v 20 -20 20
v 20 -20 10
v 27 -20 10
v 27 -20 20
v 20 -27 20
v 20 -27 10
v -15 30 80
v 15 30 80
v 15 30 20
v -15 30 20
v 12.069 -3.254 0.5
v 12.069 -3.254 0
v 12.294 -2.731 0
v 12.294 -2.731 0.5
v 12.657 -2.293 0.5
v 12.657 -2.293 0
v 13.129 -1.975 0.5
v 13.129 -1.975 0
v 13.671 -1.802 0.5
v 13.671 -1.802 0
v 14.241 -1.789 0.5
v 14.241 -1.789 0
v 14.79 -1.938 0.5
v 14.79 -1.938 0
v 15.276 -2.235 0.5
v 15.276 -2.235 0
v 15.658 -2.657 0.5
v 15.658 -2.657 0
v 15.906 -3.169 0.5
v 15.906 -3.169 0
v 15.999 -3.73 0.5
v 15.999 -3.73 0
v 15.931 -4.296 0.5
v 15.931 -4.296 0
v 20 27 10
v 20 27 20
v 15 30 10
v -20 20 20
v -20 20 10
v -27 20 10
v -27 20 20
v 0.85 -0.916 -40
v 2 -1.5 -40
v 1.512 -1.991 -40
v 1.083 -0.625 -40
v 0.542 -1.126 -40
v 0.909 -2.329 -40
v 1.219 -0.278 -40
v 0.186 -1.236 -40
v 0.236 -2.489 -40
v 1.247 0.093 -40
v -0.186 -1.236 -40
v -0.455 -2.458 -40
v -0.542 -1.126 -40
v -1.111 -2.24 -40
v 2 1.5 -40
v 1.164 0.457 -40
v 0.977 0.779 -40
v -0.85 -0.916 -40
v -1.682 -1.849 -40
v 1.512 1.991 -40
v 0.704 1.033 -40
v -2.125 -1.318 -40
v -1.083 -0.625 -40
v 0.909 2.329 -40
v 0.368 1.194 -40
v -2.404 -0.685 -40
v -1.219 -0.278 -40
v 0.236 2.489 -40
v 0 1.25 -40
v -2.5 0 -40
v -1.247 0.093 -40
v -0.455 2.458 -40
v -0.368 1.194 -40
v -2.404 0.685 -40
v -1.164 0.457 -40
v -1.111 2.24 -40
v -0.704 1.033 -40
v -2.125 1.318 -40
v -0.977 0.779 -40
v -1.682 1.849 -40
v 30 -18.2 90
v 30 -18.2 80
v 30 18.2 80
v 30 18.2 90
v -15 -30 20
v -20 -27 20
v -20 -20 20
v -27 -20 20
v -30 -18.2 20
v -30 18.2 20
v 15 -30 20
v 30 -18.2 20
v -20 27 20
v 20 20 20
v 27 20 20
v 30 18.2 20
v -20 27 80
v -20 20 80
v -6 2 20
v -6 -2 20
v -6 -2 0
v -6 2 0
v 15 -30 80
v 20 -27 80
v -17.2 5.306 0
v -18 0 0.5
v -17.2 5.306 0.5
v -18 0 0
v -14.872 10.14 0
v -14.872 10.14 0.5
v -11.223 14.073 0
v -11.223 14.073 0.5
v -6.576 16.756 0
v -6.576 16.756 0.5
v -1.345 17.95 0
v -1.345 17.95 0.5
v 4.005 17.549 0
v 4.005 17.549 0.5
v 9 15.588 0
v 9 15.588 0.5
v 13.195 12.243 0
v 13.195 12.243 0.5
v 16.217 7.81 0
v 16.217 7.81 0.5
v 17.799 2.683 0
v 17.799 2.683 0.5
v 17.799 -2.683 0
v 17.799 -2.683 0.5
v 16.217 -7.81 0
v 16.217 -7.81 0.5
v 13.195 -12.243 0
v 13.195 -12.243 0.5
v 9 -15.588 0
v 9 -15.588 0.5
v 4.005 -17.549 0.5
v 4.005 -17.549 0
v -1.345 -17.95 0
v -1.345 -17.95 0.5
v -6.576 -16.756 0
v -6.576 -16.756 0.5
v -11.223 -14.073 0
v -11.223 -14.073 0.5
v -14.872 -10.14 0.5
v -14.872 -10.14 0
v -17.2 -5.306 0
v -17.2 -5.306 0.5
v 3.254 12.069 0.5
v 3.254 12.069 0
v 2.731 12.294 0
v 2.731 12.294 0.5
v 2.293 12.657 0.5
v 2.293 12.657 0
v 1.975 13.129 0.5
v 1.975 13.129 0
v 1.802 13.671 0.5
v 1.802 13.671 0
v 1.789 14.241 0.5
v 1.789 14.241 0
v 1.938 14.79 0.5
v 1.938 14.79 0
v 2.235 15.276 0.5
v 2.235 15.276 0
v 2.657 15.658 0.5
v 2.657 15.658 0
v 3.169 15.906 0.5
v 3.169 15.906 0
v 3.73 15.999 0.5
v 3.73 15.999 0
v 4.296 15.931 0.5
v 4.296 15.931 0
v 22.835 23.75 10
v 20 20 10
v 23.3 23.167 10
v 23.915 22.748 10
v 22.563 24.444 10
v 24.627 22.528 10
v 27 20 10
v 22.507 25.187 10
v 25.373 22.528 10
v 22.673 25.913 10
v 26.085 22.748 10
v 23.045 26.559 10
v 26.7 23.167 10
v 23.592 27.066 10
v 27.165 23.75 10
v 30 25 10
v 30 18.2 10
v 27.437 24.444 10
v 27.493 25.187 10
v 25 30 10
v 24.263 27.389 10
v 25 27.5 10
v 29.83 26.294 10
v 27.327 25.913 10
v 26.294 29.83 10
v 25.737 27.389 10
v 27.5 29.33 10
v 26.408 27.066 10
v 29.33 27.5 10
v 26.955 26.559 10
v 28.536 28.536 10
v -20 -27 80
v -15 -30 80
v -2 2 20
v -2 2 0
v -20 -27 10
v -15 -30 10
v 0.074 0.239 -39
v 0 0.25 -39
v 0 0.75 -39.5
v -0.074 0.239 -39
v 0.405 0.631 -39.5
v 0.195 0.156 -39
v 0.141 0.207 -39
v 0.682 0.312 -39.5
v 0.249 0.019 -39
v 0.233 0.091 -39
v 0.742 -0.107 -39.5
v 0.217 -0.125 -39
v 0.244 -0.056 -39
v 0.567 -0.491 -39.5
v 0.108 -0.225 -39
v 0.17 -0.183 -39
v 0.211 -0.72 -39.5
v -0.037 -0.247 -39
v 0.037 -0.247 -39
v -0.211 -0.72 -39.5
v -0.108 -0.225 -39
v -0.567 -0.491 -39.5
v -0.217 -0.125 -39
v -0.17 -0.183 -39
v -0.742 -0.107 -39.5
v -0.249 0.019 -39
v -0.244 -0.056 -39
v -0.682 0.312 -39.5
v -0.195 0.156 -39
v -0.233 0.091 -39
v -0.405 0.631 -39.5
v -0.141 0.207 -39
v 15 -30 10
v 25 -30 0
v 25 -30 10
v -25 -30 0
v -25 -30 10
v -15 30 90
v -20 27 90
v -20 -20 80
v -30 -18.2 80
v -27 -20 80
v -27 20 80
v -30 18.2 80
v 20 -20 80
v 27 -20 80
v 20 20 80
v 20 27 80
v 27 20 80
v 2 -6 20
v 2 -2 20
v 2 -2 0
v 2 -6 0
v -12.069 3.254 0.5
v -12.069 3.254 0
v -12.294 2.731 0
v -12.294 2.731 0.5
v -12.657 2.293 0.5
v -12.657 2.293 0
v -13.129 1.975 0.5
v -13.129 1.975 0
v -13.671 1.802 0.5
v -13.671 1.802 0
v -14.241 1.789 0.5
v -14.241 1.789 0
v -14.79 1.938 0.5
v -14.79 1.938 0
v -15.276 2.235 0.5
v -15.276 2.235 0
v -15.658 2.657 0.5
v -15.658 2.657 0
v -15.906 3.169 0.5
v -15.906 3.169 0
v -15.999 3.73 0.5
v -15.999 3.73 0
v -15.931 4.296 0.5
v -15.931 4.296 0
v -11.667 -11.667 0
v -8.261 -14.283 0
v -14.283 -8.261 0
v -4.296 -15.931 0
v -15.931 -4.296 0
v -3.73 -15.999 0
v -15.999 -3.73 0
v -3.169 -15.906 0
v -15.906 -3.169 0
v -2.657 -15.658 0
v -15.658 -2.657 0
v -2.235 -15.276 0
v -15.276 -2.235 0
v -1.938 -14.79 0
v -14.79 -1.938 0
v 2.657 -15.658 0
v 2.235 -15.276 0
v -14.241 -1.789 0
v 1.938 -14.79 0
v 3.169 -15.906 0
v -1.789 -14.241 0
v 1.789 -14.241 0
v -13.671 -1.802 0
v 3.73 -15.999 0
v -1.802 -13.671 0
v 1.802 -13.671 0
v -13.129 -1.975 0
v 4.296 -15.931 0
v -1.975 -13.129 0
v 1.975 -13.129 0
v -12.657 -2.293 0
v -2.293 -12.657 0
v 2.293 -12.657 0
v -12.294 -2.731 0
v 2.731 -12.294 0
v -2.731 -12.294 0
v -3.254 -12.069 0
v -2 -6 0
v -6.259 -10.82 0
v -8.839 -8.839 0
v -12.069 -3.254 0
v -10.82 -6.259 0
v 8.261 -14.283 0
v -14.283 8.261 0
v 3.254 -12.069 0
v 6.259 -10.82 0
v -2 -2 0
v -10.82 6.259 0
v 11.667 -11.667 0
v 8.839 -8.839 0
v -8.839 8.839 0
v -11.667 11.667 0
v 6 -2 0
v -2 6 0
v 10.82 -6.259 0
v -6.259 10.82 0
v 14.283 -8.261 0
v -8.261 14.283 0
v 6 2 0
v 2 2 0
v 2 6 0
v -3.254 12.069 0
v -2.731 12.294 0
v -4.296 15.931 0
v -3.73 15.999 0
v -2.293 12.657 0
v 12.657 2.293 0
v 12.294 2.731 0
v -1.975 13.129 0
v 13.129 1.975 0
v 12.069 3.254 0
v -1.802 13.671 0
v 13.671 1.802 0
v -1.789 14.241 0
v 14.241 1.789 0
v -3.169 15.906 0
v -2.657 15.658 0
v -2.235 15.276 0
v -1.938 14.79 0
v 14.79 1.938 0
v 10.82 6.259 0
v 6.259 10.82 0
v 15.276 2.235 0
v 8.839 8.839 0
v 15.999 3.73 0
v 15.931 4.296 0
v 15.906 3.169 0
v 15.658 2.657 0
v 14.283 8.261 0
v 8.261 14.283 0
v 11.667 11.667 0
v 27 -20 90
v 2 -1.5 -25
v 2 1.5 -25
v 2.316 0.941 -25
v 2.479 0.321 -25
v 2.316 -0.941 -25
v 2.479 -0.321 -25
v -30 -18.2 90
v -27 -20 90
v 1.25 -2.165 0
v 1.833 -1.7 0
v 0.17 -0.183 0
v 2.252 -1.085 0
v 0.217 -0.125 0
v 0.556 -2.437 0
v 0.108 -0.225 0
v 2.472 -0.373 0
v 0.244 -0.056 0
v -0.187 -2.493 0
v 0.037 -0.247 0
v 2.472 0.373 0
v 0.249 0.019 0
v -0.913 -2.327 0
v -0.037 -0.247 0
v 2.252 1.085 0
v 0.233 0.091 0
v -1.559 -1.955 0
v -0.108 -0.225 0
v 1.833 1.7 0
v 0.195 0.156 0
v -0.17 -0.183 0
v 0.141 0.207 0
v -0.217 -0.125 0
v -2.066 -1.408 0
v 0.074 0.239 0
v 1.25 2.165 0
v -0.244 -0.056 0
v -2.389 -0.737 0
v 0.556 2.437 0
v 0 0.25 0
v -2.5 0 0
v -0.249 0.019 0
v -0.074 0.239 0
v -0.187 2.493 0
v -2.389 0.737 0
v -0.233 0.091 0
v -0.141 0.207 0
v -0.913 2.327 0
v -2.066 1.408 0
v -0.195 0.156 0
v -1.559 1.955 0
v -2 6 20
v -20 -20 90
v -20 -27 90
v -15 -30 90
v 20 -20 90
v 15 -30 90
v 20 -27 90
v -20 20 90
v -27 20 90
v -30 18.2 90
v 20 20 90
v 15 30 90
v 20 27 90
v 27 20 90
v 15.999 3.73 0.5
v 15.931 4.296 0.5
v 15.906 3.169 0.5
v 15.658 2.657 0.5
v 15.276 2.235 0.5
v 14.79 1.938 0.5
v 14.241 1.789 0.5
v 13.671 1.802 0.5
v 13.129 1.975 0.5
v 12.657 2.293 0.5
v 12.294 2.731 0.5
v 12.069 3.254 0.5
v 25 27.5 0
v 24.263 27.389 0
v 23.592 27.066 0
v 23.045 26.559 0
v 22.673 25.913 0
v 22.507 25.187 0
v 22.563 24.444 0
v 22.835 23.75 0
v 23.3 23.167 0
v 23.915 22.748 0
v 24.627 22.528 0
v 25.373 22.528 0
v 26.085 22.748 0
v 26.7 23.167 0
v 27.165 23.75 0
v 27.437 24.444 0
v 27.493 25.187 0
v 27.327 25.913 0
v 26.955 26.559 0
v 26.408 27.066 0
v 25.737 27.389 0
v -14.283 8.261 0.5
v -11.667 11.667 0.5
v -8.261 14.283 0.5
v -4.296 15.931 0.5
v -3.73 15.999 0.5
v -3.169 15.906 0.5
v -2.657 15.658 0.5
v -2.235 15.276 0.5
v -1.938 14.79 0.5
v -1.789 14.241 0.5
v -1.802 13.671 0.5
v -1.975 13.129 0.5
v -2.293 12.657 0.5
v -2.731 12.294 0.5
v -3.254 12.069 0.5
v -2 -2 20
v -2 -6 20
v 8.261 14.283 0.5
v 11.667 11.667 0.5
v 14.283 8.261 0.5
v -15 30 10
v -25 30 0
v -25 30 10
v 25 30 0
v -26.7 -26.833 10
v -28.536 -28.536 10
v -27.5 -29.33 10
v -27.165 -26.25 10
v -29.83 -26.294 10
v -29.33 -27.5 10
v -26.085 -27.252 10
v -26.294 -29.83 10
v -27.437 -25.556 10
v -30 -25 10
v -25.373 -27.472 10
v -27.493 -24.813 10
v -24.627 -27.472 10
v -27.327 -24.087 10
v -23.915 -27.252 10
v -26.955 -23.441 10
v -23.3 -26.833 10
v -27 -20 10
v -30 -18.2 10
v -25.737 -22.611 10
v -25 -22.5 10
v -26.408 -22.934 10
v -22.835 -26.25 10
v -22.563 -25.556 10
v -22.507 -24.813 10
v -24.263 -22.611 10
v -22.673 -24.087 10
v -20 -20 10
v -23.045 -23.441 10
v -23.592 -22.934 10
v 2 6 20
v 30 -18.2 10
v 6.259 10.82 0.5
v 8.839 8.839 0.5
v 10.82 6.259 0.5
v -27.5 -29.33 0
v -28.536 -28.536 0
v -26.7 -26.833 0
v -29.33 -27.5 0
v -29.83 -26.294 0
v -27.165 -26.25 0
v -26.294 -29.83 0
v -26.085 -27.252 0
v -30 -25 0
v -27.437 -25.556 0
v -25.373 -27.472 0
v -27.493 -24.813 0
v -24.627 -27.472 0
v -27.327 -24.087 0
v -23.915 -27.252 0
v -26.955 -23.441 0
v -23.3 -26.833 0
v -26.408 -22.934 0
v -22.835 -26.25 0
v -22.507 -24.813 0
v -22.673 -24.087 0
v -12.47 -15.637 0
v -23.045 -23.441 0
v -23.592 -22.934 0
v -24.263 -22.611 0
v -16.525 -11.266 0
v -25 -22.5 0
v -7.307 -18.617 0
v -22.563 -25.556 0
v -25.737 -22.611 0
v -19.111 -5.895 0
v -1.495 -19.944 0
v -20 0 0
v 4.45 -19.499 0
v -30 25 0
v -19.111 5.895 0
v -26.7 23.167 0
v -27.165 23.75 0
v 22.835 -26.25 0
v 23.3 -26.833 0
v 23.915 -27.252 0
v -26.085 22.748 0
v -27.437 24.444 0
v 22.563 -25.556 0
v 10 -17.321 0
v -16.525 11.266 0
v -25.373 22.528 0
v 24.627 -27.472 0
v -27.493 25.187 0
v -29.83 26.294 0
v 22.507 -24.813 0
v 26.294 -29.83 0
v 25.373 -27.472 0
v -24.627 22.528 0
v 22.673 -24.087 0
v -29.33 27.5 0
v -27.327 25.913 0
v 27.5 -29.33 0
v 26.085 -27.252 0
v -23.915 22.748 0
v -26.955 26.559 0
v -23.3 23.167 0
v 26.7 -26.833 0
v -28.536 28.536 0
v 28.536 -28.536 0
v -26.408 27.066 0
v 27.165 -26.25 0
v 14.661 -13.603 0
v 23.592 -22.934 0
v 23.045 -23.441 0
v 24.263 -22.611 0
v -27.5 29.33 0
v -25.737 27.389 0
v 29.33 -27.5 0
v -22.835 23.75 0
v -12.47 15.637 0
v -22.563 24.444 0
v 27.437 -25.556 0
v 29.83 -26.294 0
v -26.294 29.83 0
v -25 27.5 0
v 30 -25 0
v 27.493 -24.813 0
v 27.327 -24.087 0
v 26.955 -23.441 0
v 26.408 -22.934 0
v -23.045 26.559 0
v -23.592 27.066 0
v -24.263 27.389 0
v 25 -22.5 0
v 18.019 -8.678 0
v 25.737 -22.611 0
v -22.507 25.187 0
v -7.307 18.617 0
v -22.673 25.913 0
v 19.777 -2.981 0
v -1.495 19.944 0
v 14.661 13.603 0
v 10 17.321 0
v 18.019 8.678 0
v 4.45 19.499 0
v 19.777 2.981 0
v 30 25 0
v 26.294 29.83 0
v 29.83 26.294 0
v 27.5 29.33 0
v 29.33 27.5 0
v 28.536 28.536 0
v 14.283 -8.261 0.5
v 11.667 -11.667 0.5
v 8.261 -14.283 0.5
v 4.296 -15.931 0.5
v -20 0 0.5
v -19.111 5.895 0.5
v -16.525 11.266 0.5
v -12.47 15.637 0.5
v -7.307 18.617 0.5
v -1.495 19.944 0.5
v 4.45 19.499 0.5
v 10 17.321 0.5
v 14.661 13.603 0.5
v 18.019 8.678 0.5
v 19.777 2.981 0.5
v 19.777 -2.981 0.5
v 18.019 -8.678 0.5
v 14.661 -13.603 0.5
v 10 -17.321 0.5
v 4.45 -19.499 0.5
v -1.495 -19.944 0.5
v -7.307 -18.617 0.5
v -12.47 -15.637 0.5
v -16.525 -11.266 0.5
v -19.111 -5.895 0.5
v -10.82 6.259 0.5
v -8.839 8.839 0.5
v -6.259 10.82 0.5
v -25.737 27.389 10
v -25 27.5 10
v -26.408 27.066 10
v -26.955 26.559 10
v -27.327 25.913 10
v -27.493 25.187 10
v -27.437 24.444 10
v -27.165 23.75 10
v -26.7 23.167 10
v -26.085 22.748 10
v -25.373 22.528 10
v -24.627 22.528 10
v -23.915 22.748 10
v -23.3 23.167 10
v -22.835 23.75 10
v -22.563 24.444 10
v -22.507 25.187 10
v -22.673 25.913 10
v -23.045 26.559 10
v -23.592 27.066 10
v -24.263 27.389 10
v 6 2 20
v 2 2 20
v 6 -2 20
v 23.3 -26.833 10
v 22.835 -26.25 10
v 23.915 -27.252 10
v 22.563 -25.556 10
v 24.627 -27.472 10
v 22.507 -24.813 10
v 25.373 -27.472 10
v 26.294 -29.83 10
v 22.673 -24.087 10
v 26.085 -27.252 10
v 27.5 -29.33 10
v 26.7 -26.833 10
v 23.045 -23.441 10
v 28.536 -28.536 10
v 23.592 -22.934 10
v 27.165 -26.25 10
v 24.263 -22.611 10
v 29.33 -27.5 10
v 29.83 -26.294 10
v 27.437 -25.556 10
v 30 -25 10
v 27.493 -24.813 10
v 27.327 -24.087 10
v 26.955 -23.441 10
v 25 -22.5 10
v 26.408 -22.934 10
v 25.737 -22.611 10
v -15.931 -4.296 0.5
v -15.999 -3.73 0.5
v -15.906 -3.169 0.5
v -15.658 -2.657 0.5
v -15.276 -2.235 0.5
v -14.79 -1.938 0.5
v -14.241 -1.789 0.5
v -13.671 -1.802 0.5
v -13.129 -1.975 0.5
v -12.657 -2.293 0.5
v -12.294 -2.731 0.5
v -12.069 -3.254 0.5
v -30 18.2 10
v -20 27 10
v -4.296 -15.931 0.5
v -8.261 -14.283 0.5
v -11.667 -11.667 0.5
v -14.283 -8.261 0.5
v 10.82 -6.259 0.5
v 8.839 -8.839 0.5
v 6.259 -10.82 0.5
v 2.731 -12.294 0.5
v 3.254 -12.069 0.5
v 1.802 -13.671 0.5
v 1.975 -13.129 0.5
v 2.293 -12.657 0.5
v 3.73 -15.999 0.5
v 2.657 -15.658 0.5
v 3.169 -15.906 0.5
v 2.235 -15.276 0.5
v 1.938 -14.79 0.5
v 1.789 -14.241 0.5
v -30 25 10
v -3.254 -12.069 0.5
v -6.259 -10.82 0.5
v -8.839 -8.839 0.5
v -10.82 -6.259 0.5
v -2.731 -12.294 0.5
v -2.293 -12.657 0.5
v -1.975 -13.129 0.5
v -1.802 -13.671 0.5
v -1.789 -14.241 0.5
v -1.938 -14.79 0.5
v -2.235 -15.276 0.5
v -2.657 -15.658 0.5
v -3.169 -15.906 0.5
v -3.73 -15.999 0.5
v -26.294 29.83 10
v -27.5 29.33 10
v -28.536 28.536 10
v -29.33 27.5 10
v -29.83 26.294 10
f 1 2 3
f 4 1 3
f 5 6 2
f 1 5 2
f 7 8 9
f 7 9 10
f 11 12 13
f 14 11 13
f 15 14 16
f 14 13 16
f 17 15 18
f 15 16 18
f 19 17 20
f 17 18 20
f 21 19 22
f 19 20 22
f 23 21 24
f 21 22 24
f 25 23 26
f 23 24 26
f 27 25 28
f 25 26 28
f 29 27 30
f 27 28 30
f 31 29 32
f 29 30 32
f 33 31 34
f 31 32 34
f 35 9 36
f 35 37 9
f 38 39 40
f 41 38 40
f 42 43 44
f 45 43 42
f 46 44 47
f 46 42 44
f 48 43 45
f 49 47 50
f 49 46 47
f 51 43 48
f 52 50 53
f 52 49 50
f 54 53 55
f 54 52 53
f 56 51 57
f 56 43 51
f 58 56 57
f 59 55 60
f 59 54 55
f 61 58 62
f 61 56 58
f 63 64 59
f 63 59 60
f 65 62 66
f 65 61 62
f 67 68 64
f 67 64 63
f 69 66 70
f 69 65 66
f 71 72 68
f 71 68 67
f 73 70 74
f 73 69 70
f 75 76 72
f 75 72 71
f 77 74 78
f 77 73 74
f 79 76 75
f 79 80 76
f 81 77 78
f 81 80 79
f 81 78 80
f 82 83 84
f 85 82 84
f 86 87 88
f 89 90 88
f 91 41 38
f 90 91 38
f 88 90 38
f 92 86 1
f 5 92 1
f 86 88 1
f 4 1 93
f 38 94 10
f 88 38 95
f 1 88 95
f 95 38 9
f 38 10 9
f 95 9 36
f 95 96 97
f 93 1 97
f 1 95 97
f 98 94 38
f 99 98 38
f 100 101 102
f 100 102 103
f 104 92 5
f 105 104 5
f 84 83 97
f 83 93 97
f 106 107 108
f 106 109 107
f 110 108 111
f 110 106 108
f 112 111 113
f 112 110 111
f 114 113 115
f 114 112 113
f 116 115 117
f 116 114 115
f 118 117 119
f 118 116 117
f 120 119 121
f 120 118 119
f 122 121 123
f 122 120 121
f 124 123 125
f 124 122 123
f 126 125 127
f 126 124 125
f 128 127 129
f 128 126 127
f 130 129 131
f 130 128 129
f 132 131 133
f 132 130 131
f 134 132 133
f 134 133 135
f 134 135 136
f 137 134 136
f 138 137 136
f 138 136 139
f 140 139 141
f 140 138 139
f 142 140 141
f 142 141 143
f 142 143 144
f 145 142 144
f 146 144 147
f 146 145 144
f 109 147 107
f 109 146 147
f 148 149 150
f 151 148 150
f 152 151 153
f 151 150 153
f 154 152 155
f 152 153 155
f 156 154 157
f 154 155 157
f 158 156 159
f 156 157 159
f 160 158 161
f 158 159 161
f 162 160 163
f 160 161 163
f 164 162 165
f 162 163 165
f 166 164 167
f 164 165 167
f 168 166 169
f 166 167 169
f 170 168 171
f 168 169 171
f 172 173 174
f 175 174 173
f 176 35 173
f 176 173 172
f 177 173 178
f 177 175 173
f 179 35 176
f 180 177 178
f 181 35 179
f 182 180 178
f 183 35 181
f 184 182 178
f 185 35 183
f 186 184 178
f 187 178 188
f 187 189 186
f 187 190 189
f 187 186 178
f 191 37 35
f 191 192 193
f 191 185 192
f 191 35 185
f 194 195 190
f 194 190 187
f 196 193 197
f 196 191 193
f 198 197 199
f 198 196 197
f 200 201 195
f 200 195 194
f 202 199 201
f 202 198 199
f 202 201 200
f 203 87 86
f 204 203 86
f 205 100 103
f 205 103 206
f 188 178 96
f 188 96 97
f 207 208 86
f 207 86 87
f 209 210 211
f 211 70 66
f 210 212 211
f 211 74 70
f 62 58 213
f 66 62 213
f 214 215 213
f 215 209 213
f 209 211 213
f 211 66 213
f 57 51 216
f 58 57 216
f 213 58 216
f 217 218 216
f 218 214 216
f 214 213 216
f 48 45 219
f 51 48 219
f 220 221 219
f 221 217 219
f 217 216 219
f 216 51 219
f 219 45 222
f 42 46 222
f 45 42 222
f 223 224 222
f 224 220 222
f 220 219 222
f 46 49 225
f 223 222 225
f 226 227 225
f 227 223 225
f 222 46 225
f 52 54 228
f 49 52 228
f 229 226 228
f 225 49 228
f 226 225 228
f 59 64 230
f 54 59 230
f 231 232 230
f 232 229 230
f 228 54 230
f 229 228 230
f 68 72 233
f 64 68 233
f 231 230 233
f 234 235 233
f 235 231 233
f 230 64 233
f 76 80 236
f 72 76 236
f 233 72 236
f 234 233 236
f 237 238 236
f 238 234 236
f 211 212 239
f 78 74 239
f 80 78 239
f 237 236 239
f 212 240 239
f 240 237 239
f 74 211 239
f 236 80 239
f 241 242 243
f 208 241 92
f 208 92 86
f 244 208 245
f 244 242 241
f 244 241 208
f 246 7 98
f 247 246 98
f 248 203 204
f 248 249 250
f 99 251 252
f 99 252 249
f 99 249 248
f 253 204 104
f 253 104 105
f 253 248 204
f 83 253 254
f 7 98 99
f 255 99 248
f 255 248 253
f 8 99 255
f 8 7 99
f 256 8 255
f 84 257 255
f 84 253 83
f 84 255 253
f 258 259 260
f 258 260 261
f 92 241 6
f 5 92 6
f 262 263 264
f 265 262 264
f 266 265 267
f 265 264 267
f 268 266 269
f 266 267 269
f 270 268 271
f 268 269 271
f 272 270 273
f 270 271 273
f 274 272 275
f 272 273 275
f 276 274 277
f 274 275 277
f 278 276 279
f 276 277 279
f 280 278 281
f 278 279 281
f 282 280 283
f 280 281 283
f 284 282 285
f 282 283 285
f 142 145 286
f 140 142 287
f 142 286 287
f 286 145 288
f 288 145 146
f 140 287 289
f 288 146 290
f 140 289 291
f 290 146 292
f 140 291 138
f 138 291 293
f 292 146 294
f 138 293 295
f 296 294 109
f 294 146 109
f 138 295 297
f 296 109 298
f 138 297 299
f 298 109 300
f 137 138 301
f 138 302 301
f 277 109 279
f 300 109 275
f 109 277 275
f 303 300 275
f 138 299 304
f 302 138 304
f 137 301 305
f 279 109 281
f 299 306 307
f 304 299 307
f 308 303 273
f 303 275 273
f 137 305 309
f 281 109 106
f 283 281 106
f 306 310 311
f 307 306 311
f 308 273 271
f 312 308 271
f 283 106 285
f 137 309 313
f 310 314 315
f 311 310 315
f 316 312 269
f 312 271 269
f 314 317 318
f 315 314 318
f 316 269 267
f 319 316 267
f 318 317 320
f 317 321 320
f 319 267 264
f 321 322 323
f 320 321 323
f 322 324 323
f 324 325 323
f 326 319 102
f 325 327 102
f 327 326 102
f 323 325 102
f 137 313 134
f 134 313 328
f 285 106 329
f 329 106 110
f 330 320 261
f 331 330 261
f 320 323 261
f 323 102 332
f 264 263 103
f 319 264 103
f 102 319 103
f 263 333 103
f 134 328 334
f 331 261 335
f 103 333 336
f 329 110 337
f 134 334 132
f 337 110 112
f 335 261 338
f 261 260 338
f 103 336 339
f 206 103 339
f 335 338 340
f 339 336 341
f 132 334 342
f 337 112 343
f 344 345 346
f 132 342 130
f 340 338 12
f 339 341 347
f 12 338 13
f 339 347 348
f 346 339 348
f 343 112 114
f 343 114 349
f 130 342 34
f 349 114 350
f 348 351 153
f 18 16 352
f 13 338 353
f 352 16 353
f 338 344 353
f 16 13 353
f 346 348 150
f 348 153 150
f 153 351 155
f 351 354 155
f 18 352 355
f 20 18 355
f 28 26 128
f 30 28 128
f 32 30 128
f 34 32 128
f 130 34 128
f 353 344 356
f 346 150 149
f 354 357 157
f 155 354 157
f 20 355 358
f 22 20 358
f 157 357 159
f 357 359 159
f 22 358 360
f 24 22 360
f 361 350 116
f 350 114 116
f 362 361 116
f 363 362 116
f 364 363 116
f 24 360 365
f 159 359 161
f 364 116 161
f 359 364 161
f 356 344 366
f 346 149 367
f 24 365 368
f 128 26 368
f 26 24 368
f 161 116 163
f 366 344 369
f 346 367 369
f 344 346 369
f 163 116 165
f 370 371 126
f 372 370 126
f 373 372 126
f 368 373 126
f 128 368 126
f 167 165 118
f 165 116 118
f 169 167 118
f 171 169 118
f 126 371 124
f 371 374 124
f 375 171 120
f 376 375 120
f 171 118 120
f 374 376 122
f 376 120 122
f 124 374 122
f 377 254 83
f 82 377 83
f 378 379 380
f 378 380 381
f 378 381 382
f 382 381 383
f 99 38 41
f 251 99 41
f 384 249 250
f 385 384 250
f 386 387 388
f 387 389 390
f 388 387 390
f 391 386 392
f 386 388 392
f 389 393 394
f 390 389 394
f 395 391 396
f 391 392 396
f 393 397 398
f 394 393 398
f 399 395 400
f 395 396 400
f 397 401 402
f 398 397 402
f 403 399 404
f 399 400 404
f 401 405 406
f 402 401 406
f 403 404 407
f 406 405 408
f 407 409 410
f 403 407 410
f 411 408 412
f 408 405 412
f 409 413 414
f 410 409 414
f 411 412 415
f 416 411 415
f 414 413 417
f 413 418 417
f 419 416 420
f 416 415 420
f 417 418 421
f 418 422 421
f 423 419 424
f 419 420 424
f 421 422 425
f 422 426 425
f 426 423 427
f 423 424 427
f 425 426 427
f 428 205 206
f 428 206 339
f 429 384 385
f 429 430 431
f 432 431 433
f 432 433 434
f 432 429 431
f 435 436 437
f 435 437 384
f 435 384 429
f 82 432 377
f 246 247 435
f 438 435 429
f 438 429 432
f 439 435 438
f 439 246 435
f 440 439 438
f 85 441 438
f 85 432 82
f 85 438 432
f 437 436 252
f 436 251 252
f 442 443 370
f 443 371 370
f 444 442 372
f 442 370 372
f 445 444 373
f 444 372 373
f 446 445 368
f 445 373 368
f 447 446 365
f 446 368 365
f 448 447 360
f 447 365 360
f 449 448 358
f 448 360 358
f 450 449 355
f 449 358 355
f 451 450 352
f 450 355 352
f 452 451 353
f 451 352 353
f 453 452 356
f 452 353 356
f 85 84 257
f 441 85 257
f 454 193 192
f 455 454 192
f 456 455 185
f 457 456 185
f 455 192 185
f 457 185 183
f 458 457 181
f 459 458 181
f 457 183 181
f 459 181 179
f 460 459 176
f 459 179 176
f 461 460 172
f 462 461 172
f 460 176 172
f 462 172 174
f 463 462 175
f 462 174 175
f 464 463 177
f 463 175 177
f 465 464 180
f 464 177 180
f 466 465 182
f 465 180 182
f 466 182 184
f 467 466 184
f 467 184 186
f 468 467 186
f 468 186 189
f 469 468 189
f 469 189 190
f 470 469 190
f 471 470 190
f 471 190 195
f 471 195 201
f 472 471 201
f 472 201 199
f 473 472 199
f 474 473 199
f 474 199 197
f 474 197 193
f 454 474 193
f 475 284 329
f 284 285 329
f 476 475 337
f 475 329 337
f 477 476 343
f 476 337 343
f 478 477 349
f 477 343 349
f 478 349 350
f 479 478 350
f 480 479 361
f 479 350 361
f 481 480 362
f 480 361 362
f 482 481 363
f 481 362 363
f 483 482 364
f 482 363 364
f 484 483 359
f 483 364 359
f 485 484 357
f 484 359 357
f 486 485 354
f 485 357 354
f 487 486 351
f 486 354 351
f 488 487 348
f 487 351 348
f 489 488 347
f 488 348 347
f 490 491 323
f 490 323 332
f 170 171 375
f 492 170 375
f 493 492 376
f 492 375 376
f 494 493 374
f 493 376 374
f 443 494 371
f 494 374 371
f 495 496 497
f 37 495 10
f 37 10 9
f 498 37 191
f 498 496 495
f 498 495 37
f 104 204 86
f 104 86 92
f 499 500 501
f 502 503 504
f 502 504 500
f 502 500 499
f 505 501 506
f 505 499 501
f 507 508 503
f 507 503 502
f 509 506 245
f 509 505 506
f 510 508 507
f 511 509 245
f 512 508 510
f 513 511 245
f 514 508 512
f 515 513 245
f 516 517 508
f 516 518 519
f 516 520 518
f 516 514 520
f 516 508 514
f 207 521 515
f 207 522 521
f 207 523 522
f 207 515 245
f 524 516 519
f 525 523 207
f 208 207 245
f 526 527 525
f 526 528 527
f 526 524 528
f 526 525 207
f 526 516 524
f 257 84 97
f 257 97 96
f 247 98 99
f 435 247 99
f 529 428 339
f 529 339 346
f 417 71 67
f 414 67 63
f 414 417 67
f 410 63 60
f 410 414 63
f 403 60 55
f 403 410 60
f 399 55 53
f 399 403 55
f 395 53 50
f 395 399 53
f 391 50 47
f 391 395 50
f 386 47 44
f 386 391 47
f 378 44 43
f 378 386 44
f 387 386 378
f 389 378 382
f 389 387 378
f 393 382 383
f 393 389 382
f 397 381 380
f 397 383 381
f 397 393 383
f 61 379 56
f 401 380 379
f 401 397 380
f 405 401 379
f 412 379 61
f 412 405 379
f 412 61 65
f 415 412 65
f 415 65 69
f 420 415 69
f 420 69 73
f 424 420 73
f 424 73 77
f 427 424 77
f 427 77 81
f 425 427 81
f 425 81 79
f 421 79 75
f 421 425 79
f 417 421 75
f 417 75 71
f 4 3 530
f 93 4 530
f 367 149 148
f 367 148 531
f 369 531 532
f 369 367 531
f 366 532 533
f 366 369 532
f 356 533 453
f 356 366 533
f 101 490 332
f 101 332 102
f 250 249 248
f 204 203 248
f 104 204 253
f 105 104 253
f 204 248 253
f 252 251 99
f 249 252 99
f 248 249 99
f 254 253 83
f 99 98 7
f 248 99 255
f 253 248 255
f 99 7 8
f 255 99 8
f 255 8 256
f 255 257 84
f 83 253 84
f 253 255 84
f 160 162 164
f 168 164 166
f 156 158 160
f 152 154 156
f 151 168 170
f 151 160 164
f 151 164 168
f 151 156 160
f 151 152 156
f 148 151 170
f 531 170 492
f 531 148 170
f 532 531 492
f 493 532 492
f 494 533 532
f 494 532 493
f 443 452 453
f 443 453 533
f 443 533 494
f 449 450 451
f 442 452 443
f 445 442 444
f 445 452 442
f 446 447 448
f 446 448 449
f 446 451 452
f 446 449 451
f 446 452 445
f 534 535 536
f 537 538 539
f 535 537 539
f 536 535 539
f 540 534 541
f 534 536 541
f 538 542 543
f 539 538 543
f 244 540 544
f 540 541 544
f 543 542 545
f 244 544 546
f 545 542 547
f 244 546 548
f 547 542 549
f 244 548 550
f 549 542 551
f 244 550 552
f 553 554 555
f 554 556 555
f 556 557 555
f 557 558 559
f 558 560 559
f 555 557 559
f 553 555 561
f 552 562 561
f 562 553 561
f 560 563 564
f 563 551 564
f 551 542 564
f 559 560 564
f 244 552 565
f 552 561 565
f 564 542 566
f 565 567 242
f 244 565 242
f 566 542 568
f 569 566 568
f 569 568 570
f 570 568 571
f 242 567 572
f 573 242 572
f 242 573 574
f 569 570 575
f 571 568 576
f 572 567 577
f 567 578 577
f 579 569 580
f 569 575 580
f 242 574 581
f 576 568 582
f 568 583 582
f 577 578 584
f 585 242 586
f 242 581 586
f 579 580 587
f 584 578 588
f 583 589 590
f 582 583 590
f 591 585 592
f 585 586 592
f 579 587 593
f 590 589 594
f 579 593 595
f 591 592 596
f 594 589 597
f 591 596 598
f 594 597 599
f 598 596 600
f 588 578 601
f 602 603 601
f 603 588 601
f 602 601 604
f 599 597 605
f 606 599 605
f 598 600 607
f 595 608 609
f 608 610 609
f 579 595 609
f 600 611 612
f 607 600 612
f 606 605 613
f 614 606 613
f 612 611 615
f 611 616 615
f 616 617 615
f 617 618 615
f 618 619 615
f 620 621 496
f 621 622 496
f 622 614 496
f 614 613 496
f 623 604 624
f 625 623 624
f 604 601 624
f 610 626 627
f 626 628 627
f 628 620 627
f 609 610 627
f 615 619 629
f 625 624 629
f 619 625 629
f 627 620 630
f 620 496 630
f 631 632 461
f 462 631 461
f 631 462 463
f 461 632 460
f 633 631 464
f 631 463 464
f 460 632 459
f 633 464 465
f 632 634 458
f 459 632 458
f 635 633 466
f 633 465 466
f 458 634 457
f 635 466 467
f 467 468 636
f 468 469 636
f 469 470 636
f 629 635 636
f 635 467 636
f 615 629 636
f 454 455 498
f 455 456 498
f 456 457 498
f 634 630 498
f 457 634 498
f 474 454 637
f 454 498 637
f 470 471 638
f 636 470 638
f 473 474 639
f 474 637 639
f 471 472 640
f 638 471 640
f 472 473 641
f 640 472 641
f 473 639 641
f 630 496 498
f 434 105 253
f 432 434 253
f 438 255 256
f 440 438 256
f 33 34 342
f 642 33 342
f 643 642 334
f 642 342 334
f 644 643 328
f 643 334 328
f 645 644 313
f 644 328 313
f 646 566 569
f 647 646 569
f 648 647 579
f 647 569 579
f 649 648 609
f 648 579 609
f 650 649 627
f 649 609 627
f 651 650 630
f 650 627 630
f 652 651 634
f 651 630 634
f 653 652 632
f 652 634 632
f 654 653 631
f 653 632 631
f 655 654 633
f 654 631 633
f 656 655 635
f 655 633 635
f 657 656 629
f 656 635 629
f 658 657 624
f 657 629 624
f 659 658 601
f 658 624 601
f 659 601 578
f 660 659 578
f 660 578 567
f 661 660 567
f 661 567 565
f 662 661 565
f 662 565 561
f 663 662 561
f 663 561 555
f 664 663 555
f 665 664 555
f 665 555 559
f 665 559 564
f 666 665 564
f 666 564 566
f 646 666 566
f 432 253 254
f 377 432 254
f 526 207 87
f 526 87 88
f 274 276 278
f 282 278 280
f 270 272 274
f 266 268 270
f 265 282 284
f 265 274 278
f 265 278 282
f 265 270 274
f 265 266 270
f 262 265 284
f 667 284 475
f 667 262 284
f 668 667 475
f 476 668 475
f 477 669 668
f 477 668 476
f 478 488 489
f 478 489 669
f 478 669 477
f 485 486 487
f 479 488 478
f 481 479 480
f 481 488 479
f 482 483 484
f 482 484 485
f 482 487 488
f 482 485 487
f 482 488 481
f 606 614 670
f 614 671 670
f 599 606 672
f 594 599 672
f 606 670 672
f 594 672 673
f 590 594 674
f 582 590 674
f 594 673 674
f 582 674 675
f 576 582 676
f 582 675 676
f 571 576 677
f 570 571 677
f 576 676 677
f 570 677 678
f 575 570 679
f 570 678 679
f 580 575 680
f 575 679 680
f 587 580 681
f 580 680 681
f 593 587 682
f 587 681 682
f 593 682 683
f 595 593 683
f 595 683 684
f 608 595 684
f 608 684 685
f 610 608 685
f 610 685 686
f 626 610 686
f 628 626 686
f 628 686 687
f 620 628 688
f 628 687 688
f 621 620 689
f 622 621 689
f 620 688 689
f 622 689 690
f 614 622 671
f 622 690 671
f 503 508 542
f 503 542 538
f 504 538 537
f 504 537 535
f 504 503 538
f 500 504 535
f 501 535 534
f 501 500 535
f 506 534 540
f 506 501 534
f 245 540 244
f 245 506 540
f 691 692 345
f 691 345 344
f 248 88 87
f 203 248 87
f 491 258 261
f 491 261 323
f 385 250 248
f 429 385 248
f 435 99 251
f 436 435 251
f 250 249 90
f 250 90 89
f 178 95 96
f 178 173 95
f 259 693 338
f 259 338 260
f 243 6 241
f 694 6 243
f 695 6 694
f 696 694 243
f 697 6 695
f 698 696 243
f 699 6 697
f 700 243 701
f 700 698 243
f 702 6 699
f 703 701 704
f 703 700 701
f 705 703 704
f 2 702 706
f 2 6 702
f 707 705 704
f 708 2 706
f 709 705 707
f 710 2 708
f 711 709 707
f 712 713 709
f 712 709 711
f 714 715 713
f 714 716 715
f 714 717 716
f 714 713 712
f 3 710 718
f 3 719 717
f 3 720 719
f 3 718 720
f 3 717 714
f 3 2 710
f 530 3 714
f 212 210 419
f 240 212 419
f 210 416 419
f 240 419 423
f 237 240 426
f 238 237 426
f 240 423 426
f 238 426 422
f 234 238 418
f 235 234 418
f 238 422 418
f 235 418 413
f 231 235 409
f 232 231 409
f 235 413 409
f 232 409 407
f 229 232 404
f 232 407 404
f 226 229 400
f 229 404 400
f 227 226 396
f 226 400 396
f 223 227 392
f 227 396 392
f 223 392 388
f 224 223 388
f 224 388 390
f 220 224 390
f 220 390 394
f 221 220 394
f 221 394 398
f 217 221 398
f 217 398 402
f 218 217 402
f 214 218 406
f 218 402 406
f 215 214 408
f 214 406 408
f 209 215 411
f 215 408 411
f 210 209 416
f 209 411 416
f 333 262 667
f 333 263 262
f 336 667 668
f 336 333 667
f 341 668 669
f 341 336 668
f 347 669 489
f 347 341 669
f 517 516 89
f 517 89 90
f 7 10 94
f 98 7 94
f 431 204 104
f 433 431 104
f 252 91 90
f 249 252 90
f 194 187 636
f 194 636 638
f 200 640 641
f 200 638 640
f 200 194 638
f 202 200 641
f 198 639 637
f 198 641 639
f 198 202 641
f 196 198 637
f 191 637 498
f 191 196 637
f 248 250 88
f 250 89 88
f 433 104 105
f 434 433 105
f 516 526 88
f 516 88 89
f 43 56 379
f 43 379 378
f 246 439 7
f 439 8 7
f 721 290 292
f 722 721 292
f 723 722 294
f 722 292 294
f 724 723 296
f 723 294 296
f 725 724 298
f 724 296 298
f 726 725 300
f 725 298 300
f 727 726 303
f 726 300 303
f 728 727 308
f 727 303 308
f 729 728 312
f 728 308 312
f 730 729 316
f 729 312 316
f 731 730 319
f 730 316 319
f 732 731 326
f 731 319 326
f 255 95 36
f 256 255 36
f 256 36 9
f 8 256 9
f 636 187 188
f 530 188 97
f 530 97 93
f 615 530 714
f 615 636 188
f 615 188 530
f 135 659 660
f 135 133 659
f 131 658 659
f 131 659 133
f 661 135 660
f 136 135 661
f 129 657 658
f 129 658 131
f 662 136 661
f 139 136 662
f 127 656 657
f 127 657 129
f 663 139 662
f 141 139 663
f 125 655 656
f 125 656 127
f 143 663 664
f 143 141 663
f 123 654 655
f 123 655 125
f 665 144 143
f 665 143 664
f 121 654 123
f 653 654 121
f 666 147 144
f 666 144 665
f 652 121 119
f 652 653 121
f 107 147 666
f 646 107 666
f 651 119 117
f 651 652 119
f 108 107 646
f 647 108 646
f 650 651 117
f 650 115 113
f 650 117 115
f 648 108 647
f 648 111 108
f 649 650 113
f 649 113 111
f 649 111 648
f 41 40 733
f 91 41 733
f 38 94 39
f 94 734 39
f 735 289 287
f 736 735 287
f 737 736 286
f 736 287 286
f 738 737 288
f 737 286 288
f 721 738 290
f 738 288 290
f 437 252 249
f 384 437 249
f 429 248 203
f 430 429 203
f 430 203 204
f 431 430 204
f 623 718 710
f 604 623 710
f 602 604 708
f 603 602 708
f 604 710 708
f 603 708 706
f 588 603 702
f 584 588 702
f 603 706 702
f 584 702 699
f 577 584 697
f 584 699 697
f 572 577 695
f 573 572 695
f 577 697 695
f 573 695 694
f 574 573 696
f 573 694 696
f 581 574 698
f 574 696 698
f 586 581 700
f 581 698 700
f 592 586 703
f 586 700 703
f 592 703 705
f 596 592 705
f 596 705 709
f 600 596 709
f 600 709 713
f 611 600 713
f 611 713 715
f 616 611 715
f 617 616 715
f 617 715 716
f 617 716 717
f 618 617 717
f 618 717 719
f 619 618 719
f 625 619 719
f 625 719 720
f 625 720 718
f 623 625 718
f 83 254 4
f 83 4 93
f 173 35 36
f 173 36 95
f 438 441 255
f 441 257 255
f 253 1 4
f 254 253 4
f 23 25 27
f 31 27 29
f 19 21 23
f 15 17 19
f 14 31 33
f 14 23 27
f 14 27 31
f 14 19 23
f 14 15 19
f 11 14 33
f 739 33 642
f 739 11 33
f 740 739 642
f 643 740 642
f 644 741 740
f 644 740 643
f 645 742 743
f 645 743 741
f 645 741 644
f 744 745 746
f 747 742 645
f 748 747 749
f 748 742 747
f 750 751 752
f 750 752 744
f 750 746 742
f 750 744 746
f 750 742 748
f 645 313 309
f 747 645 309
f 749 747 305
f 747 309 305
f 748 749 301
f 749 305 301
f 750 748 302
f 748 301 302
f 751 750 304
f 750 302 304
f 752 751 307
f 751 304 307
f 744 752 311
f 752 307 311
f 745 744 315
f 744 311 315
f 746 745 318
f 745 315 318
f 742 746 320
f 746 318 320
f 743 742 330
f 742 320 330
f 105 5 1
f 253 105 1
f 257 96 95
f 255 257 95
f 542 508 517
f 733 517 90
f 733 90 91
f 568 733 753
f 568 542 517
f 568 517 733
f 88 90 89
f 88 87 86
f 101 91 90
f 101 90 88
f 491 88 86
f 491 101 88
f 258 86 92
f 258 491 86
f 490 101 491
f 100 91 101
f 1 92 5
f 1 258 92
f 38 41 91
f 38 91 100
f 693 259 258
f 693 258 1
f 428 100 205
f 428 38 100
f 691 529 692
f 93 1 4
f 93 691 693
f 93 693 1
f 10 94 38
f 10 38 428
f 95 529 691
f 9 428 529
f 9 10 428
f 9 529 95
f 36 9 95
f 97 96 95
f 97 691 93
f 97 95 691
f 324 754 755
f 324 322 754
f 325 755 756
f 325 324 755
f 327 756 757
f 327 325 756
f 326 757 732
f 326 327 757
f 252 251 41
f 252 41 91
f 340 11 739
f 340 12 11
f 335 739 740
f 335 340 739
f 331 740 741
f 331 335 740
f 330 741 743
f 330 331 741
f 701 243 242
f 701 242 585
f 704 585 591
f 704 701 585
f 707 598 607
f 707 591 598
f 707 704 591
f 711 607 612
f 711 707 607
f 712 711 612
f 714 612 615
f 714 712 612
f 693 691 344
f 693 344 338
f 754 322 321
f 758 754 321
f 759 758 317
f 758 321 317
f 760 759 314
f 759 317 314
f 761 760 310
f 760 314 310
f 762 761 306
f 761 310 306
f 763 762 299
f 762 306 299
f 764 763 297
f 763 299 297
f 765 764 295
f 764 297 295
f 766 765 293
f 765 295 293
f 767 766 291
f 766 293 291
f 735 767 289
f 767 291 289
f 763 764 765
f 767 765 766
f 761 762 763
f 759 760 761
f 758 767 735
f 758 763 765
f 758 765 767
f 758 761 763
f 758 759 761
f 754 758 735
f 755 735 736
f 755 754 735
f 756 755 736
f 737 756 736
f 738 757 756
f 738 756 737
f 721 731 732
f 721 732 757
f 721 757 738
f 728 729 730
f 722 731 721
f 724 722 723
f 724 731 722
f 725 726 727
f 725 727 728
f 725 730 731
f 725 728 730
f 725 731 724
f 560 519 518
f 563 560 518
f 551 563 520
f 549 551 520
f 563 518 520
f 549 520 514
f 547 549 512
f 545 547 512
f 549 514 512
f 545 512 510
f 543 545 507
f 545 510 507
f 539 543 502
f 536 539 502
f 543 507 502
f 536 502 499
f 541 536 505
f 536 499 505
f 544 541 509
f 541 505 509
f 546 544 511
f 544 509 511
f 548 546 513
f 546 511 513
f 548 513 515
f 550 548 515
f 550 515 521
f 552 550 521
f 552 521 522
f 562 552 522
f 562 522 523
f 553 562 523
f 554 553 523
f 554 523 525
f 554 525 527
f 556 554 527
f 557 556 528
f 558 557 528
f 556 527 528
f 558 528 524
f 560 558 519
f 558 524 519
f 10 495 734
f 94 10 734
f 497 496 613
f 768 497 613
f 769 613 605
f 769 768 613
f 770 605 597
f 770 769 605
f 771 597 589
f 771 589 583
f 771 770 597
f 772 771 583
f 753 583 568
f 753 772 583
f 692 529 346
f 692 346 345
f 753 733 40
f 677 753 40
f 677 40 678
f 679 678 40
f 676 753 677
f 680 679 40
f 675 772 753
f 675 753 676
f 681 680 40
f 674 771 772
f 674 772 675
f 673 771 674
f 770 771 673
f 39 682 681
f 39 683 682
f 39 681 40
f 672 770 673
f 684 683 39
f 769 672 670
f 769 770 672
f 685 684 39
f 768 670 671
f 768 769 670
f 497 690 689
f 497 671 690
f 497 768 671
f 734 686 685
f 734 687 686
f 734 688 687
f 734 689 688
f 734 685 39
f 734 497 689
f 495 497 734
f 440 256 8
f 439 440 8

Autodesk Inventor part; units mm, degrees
ref_plane "XZ Plane" through (0, 0, 0) normal (0, 1, 0) x (-1, 0, 0)
ref_plane "XY Plane" through (0, 0, 0) normal (0, 0, 1) x (1, 0, 0)
sketch "Sketch1" plane through (0, 0, 0) normal (0, 0, 1) x (1, 0, 0)
  line L0 (-30, 30) -> (30, 30)
  line L1 (30, 30) -> (30, -30)
  line L2 (30, -30) -> (-30, -30)
  line L3 (-30, -30) -> (-30, 30)
  line L4 (-30, 30) -> (30, -30) construction
  line L5 (30, 30) -> (-30, -30) construction
  point P0 (0, 0)
  dimension "d0" = 60
  dimension "d1" = 60
extrude "Extrusion1" add sketch "Sketch1" along normal blind 10
sketch "Sketch2" plane through (0, 0, 10) normal (0, 0, 1) x (1, 0, 0)
  line L0 (-30, -30) -> (30, -30) projected
  line L1 (30, -30) -> (30, 30) projected
  line L2 (30, 30) -> (-30, 30) projected
  line L3 (-30, 30) -> (-30, -30) projected
  line L4 (30, 30) -> (-30, 30) projected
  line L5 (0, 30) -> (-15, 30)
  line L6 (-15, 30) -> (-20, 27)
  line L7 (-20, 27) -> (-20, 20)
  line L8 (-20, 20) -> (-27, 20)
  line L9 (-27, 20) -> (-30, 18.2)
  line L10 (-30, 30) -> (-30, -30) projected
  line L11 (0, 30) -> (0, 0)
  line L12 (0, 0) -> (-30, 0)
  line L13 (15, 30) -> (20, 27)
  line L14 (20, 27) -> (20, 20)
  line L15 (20, 20) -> (27, 20)
  line L16 (27, 20) -> (30, 18.2)
  line L17 (0, -30) -> (-15, -30)
  line L18 (-15, -30) -> (-20, -27)
  line L19 (-20, -27) -> (-20, -20)
  line L20 (-20, -20) -> (-27, -20)
  line L21 (-27, -20) -> (-30, -18.2)
  line L22 (15, -30) -> (20, -27)
  line L23 (20, -27) -> (20, -20)
  line L24 (20, -20) -> (27, -20)
  line L25 (27, -20) -> (30, -18.2)
  dimension "d4" = 15
  dimension "d5" = 3
  dimension "d6" = 5
  dimension "d7" = 10
  dimension "d8" = 3
extrude "Extrusion2" add sketch "Sketch2" along normal blind 10 contours L18 L19 L20 L21 L3 L12 L11 L2 L13 L14 L15 L16 L1 L25 L24 L23 L22 L0 | L3 L9 L8 L7 L6 L2 L11 L12
sketch "Sketch3" plane through (0, 0, 20) normal (0, 0, 1) x (1, 0, 0)
  line L0 (-27, 20) -> (-30, 18.2) projected
  line L1 (-30, 18.2) -> (-30, -18.2) projected
  line L2 (-30, -18.2) -> (-27, -20) projected
  line L3 (-27, -20) -> (-20, -20) projected
  line L4 (-20, -20) -> (-20, -27) projected
  line L5 (-20, -27) -> (-15, -30) projected
  line L6 (-15, -30) -> (15, -30) projected
  line L7 (15, -30) -> (20, -27) projected
  line L8 (20, -27) -> (20, -20) projected
  line L9 (20, -20) -> (27, -20) projected
  line L10 (27, -20) -> (30, -18.2) projected
  line L11 (30, -18.2) -> (30, 18.2) projected
  line L12 (30, 18.2) -> (27, 20) projected
  line L13 (27, 20) -> (20, 20) projected
  line L14 (20, 20) -> (20, 27) projected
  line L15 (20, 27) -> (15, 30) projected
  line L16 (15, 30) -> (-15, 30) projected
  line L17 (-15, 30) -> (-20, 27) projected
  line L18 (-20, 27) -> (-20, 20) projected
  line L19 (-20, 20) -> (-27, 20) projected
  point P0 (0, 0)
extrude "Extrusion3" add sketch "Sketch3" along normal blind 60 separate body
sketch "Sketch4" plane through (0, 0, 80) normal (0, 0, 1) x (1, 0, 0)
  line L0 (-30, 18.2) -> (-30, -18.2) projected
  line L1 (-30, -18.2) -> (-27, -20) projected
  line L2 (-27, -20) -> (-20, -20) projected
  line L3 (-20, -20) -> (-20, -27) projected
  line L4 (-20, -27) -> (-15, -30) projected
  line L5 (-15, -30) -> (15, -30) projected
  line L6 (15, -30) -> (20, -27) projected
  line L7 (20, -27) -> (20, -20) projected
  line L8 (20, -20) -> (27, -20) projected
  line L9 (27, -20) -> (30, -18.2) projected
  line L10 (30, -18.2) -> (30, 18.2) projected
  line L11 (30, 18.2) -> (27, 20) projected
  line L12 (27, 20) -> (20, 20) projected
  line L13 (20, 20) -> (20, 27) projected
  line L14 (20, 27) -> (15, 30) projected
  line L15 (15, 30) -> (-15, 30) projected
  line L16 (-15, 30) -> (-20, 27) projected
  line L17 (-20, 27) -> (-20, 20) projected
  line L18 (-20, 20) -> (-27, 20) projected
  line L19 (-27, 20) -> (-30, 18.2) projected
  point P0 (0, 0)
extrude "Extrusion4" add sketch "Sketch4" along normal blind 10 separate body
fillet "Fillet1" radius 5 4 edges at (30, 30, 5) (30, -30, 5) (-30, 30, 5) (-30, -30, 5)
sketch "Sketch5" plane through (0, 0, 0) normal (0, 0, -1) x (-1, 0, 0)
  line L0 (-25, -25) -> (25, -25) construction
  line L1 (25, -25) -> (25, 25) construction
  line L2 (25, 25) -> (-25, 25) construction
  line L3 (-25, 25) -> (-25, -25) construction
  line L4 (-25, -25) -> (25, 25) construction
  line L5 (25, -25) -> (-25, 25) construction
  point P0 (0, 0)
  dimension "d16" = 50
  dimension "d17" = 50
hole "Hole1" at (-25, 25, 0) at (-25, -25, 0) at (25, 25, 0) at (25, -25, 0) direction (0, 0, 1) diameter 5 end through all bodies 1
sketch "Sketch6" plane through (0, 0, 0) normal (0, 0, -1) x (-1, 0, 0)
  circle A0 centre (0, 0) radius 20
  circle A1 centre (0, 0) radius 18
  dimension "d25" = 40
  dimension "d26" = 36
extrude "Extrusion5" cut sketch "Sketch6" against normal blind 0.5 bodies 1
sketch "Sketch7" plane through (0, 0, 0) normal (0, 0, -1) x (-1, 0, 0)
  circle A0 centre (0, 0) radius 2.5
  line L0 (-6, -2) -> (6, -2)
  line L1 (6, -2) -> (6, 2)
  line L2 (6, 2) -> (-6, 2)
  line L3 (-6, 2) -> (-6, -2)
  line L4 (-6, -2) -> (6, 2) construction
  line L5 (6, -2) -> (-6, 2) construction
  line L6 (-2, -6) -> (2, -6)
  line L7 (2, -6) -> (2, 6)
  line L8 (2, 6) -> (-2, 6)
  line L9 (-2, 6) -> (-2, -6)
  line L10 (-2, -6) -> (2, 6) construction
  line L11 (2, -6) -> (-2, 6) construction
  point P0 (2, 2)
  point P1 (-2, 2)
  point P2 (-2, -2)
  point P3 (2, -2)
  dimension "d29" = 5
  dimension "d30" = 12
  dimension "d31" = 4
  dimension "d32" = 4
  dimension "d33" = 12
extrude "Extrusion6" cut sketch "Sketch7" against normal through all bodies 1
sketch "Sketch8" plane through (0, 0, 0) normal (0, 0, -1) x (-1, 0, 0)
  circle A0 centre (0, 0) radius 2.5
  dimension "d36" = 5
extrude "Extrusion7" add sketch "Sketch8" along normal blind 40 bodies 1
sketch "Sketch9" plane through (0, 0, -40) normal (0, 0, -1) x (-1, 0, 0)
  circle A0 centre (0, 0) radius 2.5 projected
  line L0 (-2, 1.5) -> (-2, -1.5)
  dimension "d39" = 2
extrude "Extrusion8" cut sketch "Sketch9" against normal blind 15 contours L0 A0 picked at (-2.0912, -0.3466) bodies 1
sketch "Sketch10" plane through (0, 0, -40) normal (0, 0, -1) x (-1, 0, 0)
  circle A0 centre (0, 0) radius 2.5 projected
hole "Hole2" at (0, 0, -40) direction (0, 0, 1) diameter 0.5 end through all countersink diameter 2.5 countersink angle 90 bodies 1
sketch "Sketch11" plane through (0, 0, 0) normal (0, 0, -1) x (-1, 0, 0)
  circle A0 centre (0, 0) radius 2.5 projected
  arc A1 (3.7749, -14) -> (14, -3.7749) centre (0, 0) ccw construction
  arc A2 (4.2956, -15.931) -> (15.931, -4.2956) centre (0, 0) ccw
  arc A3 (3.2542, -12.069) -> (12.069, -3.2542) centre (0, 0) ccw
  arc A4 (3.2542, -12.069) -> (4.2956, -15.931) centre (3.7749, -14) ccw
  arc A5 (15.931, -4.2956) -> (12.069, -3.2542) centre (14, -3.7749) ccw
  dimension "d49" = 14.5
  dimension "d50" = 14
  dimension "d51" = 14
  dimension "d52" = 2
extrude "Extrusion9" cut sketch "Sketch11" against normal blind 0.5 contours A4 A3 A5 A2 bodies 1
pattern_circular "Circular Pattern1" count 4 over 360 about axis through (0, 0, 0) along (0, 0, 1) of "Extrusion9" bodies 1
ref_plane "Work Plane1" through (0, 0, 0) normal (1, 0, 0) x (0, 1, 0)
properties part number "servo"
